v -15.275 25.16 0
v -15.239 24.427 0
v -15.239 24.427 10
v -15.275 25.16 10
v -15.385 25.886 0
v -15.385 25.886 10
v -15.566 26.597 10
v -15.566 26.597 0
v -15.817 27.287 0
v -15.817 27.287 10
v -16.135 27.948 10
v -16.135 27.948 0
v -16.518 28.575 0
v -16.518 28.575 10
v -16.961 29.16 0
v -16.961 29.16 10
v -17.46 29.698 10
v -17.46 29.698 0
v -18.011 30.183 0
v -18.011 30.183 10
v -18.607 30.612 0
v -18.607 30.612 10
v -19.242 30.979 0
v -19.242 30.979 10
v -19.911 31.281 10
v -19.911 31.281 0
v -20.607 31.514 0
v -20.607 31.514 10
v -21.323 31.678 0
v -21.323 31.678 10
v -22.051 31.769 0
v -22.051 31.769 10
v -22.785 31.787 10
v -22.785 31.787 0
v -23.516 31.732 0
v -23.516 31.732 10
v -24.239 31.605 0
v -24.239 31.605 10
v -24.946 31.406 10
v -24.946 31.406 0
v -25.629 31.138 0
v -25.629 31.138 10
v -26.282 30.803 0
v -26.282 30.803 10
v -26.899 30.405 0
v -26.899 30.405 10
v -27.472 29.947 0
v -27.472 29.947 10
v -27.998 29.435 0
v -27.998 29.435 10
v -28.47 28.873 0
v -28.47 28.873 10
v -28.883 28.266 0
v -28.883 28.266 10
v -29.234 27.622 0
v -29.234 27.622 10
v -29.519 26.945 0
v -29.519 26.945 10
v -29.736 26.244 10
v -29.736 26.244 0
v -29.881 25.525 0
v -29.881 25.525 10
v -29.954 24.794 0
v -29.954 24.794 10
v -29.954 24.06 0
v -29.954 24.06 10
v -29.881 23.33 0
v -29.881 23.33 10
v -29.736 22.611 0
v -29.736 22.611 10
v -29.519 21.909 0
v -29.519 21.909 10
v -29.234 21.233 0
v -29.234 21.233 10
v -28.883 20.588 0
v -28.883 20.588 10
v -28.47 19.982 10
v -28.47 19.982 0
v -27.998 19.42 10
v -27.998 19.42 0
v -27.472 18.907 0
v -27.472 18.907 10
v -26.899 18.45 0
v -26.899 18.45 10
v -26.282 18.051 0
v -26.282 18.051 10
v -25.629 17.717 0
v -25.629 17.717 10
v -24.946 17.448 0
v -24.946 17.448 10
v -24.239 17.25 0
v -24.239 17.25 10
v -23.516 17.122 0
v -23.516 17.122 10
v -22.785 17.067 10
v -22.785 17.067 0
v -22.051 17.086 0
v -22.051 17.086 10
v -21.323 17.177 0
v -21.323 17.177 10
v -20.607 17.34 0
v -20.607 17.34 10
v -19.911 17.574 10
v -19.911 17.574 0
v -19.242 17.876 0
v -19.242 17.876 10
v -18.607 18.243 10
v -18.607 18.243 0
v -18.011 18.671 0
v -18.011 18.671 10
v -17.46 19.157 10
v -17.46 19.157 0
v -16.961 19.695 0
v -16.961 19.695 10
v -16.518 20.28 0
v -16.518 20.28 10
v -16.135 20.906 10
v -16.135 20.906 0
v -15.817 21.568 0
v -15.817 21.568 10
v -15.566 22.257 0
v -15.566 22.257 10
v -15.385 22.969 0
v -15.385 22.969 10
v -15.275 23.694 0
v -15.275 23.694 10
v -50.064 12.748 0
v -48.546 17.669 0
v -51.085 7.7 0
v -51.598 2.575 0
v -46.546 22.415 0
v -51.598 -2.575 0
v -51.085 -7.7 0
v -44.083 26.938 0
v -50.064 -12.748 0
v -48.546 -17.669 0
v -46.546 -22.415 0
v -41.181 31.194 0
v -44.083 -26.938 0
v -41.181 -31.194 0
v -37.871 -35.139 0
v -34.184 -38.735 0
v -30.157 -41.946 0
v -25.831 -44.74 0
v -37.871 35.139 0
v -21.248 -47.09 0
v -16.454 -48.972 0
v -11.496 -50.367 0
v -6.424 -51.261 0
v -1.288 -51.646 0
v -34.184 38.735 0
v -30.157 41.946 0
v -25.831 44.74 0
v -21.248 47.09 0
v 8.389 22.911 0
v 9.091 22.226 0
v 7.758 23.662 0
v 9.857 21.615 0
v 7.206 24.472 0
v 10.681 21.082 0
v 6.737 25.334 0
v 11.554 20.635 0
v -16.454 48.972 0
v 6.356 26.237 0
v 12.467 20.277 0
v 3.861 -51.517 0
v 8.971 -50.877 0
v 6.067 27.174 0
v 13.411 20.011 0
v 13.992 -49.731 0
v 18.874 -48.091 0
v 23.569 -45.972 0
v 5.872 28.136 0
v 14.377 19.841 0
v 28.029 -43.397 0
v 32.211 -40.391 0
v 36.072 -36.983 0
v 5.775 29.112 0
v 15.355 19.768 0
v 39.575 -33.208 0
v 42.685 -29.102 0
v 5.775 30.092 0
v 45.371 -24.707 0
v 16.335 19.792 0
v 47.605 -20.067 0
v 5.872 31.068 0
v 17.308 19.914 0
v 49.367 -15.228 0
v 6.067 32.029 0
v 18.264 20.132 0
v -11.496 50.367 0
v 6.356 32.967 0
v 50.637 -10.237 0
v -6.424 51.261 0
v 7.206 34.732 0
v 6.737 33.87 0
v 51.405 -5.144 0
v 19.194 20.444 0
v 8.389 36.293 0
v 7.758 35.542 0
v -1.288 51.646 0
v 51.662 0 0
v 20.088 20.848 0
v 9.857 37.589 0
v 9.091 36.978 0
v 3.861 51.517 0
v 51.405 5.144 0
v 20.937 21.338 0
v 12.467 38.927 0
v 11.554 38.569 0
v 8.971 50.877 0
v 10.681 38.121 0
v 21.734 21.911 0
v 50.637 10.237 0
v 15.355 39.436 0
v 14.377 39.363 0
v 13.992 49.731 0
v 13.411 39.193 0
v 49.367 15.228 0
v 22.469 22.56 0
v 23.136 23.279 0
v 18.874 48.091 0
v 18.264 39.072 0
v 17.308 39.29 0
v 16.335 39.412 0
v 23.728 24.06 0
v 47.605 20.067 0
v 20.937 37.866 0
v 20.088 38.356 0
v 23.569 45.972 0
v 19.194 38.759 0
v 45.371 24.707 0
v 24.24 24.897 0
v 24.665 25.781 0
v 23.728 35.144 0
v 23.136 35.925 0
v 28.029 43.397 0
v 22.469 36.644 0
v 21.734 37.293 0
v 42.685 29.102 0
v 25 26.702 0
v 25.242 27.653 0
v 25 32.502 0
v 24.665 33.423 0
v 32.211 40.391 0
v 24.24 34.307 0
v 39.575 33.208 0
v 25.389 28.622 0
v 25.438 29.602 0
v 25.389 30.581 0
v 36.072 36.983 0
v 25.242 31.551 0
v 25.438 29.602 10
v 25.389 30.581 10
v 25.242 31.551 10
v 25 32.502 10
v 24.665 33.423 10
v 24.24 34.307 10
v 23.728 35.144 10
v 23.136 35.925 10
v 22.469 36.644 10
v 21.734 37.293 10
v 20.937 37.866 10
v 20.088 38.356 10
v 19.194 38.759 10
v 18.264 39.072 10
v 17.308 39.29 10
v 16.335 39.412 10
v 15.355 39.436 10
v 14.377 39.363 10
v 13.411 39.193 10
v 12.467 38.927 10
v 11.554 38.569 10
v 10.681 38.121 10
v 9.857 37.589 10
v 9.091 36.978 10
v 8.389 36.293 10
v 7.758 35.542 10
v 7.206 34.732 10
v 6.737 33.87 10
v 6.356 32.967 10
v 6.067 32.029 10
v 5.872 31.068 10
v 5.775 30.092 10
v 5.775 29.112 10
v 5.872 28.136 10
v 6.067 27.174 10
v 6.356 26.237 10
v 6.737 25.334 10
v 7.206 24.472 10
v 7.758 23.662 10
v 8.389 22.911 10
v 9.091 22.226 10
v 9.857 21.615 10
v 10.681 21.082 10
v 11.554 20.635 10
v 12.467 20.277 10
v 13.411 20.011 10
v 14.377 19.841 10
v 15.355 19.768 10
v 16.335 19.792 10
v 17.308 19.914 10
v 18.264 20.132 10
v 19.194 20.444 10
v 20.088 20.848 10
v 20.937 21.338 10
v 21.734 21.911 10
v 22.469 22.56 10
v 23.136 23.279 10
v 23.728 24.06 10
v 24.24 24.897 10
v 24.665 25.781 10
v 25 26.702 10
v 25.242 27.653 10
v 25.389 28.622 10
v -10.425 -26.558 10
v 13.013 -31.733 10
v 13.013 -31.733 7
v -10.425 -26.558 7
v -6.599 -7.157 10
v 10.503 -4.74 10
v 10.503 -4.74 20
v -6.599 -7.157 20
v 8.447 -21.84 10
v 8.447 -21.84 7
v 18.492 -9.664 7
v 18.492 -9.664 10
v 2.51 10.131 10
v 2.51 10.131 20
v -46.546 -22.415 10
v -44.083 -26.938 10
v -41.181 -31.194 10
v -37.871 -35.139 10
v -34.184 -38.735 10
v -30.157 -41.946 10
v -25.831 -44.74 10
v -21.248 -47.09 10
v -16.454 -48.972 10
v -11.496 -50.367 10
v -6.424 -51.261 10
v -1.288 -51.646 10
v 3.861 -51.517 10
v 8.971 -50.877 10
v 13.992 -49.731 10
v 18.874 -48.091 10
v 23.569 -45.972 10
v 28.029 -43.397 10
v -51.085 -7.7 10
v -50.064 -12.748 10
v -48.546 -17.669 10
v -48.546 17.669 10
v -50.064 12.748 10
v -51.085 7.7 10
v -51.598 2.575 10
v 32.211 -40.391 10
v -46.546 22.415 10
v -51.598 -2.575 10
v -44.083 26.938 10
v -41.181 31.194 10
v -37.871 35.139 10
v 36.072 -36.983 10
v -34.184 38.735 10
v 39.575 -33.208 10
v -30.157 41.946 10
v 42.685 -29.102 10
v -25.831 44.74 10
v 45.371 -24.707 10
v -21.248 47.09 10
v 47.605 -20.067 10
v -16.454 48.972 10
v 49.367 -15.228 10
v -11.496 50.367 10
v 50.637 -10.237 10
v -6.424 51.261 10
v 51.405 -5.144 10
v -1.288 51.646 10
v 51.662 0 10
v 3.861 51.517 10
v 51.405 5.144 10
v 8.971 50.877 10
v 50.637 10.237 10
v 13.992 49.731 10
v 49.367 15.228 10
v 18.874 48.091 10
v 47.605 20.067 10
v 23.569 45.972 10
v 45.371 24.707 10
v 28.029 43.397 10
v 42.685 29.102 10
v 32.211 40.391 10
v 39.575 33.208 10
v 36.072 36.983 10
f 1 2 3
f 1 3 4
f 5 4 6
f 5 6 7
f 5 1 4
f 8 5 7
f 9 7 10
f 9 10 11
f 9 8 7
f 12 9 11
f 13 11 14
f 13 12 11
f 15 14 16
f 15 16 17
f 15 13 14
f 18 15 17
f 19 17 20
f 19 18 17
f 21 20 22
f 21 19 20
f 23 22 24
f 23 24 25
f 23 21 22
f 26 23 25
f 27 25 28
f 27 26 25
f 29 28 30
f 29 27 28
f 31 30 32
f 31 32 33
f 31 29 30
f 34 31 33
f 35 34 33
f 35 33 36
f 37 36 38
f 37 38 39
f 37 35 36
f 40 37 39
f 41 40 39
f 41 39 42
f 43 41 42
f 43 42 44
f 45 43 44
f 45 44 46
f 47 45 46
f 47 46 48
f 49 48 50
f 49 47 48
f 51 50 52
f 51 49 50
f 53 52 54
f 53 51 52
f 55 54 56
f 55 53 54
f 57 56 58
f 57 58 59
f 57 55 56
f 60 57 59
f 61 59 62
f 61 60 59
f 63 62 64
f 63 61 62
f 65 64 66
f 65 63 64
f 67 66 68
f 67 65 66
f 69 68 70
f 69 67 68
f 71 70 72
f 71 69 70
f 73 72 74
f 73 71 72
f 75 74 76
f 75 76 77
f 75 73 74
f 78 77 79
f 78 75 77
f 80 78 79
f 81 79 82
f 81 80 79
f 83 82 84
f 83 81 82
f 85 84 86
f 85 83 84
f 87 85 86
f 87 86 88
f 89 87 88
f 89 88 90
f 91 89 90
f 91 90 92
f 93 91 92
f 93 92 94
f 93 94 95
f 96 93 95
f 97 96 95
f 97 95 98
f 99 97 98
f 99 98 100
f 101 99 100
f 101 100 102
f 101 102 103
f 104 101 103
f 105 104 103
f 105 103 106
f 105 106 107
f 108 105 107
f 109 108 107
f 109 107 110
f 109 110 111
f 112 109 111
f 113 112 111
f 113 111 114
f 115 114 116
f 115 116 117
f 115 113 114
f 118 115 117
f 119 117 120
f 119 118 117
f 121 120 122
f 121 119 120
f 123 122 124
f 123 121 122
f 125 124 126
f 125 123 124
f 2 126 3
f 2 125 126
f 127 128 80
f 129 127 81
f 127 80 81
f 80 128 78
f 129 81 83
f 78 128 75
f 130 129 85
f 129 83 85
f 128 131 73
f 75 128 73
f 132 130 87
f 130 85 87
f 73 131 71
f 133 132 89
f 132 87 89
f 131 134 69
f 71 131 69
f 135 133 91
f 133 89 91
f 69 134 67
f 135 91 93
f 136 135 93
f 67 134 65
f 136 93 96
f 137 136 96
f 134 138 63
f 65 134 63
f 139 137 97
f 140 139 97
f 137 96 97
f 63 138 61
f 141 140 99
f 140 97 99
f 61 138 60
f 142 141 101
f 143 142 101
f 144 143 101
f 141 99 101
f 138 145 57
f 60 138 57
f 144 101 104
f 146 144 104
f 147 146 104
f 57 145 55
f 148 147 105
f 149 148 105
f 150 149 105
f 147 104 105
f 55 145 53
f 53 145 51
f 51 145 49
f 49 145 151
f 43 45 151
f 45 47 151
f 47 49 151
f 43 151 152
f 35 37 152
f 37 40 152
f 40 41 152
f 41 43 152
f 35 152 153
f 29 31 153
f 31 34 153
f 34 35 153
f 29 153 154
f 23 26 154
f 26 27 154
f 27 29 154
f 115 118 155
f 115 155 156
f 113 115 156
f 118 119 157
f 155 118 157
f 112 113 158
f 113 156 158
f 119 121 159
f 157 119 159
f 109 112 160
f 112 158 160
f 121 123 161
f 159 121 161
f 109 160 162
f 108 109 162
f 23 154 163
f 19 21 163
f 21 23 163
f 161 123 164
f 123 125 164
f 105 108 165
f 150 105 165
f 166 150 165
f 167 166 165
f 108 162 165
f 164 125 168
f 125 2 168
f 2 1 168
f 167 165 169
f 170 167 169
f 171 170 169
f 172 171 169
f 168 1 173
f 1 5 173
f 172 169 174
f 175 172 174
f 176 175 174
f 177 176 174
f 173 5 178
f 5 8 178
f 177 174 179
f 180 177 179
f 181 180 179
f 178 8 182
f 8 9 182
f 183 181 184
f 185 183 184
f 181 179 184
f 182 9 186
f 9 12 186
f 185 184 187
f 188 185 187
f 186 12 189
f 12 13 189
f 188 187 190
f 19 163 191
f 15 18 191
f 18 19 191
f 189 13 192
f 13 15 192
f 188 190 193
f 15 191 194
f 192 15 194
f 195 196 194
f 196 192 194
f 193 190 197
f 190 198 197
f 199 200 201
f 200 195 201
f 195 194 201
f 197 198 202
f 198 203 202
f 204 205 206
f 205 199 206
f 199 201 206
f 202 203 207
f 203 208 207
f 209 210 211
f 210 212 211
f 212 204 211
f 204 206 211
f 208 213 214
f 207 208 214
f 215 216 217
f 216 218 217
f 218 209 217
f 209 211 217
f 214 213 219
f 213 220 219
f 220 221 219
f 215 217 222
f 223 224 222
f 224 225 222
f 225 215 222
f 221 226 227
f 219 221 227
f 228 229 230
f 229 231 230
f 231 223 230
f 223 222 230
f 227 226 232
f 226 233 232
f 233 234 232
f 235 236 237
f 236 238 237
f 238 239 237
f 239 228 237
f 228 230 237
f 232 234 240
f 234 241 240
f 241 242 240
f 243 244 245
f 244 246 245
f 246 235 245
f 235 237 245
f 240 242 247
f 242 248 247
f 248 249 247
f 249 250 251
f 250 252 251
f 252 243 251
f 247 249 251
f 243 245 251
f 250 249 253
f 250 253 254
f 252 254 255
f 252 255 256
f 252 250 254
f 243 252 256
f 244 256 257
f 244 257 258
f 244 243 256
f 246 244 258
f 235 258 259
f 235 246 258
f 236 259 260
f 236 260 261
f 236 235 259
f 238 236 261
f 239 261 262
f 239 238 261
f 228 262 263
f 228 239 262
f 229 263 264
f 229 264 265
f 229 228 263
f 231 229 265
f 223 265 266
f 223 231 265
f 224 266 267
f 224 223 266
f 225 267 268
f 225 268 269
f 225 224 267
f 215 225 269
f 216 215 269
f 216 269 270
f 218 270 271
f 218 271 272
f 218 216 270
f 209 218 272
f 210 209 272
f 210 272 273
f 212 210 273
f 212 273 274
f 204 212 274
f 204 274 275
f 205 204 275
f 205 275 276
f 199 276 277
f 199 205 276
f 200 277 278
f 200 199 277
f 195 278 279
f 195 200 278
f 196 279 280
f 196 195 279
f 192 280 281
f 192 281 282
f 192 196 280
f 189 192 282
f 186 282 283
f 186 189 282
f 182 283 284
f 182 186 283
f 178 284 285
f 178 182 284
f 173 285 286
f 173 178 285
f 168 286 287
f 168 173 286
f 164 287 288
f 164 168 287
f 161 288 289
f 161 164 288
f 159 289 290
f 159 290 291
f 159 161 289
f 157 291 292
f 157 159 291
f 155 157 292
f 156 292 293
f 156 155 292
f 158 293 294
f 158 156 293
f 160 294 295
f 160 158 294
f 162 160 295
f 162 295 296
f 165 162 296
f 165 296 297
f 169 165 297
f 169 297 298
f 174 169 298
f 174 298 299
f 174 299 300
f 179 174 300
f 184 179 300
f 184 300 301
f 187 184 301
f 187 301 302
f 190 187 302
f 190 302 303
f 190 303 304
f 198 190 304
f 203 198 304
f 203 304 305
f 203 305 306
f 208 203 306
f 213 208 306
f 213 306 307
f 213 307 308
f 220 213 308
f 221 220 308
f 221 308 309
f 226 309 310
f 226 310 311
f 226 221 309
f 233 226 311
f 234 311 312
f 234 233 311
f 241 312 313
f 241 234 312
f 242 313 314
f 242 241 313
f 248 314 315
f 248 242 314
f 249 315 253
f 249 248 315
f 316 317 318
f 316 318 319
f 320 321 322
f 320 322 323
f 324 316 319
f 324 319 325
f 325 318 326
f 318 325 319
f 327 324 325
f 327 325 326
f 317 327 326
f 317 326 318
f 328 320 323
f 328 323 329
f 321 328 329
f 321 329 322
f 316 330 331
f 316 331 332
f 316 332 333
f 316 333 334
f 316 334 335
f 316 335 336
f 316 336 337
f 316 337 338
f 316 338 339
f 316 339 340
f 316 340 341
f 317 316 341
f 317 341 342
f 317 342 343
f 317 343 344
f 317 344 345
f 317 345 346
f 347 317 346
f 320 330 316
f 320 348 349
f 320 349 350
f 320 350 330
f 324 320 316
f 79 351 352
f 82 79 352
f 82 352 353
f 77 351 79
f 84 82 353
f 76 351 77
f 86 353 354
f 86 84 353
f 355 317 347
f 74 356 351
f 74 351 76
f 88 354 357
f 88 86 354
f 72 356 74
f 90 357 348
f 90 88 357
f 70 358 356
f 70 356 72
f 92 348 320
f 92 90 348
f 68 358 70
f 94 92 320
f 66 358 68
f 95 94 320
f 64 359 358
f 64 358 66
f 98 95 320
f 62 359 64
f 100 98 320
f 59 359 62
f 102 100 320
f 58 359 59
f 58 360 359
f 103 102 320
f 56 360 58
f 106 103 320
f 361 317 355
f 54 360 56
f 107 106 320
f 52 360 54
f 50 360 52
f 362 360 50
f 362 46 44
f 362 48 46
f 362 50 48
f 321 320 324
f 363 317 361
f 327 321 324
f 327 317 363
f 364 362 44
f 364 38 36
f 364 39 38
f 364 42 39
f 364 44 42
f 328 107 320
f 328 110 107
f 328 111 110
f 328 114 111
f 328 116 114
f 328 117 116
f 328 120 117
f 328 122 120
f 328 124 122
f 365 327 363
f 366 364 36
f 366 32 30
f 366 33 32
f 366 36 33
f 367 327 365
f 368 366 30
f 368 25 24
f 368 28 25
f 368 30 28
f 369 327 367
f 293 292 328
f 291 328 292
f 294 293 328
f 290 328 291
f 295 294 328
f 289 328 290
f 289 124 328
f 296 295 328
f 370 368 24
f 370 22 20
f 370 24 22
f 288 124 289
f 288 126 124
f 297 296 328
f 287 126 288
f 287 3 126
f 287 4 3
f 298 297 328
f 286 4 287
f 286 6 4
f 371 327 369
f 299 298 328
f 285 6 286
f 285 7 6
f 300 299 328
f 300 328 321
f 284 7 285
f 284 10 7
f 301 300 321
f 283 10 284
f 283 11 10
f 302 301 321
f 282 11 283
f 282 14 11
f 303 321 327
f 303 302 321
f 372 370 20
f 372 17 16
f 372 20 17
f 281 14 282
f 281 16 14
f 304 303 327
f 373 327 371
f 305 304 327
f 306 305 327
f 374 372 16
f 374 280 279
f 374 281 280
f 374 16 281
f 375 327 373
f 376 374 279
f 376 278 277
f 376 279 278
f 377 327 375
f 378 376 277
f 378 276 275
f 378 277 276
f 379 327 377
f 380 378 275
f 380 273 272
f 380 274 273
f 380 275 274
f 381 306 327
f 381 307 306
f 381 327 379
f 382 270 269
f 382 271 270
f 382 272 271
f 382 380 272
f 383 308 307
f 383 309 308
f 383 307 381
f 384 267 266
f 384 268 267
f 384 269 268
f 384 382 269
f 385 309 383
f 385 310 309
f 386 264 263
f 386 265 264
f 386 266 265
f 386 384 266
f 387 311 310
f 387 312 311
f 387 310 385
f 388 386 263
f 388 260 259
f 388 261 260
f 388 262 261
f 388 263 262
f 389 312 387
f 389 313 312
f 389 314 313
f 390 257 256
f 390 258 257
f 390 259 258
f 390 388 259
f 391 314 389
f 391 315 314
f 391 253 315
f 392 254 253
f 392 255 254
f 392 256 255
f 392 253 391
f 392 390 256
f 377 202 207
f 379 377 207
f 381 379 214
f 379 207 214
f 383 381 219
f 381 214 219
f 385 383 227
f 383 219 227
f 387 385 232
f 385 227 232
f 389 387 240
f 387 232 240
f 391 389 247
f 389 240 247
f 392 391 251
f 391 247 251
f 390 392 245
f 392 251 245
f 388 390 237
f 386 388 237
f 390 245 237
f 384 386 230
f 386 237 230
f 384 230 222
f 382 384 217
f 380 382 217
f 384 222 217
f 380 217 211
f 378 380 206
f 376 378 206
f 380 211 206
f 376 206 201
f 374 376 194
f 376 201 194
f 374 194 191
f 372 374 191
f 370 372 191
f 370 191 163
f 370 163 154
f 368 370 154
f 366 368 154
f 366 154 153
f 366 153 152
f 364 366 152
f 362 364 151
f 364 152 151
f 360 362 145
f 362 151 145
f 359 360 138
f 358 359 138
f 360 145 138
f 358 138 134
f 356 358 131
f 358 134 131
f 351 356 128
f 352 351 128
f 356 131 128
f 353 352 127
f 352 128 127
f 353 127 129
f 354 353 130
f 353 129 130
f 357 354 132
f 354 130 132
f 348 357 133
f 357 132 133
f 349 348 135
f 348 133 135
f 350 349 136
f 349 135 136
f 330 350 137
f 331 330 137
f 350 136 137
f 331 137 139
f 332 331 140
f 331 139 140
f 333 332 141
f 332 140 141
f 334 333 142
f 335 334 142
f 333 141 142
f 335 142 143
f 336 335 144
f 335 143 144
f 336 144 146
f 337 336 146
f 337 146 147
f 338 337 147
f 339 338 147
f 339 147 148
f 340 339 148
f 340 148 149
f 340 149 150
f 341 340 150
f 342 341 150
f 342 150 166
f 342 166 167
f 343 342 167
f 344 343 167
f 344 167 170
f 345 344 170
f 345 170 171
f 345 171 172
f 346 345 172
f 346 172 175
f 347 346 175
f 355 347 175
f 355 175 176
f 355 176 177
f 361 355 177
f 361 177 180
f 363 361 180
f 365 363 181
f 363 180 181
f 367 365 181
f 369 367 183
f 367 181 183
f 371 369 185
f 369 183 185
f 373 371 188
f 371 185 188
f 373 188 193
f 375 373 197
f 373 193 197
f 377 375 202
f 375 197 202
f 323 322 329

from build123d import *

# Parameters (mm, degrees)
SKETCH_R     = 51.661794
SKETCH_R_2   = 7.362217
SKETCH_R_3   = 9.837508
PAD_DEPTH    = 10
POCKET_DEPTH = 3
PAD001_DEPTH = 10


with BuildPart() as part:
    # Sketch → Pad (new body)
    with BuildSketch(Plane.XY):
        Circle(SKETCH_R)
        with Locations((-22.600981, 24.427324)):
            Circle(SKETCH_R_2, mode=Mode.SUBTRACT)
        with Locations((15.600001, 29.601961)):
            Circle(SKETCH_R_3, mode=Mode.SUBTRACT)
    extrude(amount=PAD_DEPTH)

    # Sketch001 → Pocket (cut)
    with BuildSketch(Plane.XY.offset(10)):
        Polygon((-10.425369, -26.558058), (8.446838, -21.840006), (18.491709, -9.664394), (13.012688, -31.732695), align=None)
    extrude(amount=-POCKET_DEPTH, mode=Mode.SUBTRACT)

    # Sketch002 → Pad001 (new body)
    with BuildSketch(Plane.XY.offset(10)):
        Polygon((-6.599153, -7.156828), (2.509538, 10.131093), (10.50287, -4.740234), align=None)
    extrude(amount=PAD001_DEPTH)


solid = part.part
